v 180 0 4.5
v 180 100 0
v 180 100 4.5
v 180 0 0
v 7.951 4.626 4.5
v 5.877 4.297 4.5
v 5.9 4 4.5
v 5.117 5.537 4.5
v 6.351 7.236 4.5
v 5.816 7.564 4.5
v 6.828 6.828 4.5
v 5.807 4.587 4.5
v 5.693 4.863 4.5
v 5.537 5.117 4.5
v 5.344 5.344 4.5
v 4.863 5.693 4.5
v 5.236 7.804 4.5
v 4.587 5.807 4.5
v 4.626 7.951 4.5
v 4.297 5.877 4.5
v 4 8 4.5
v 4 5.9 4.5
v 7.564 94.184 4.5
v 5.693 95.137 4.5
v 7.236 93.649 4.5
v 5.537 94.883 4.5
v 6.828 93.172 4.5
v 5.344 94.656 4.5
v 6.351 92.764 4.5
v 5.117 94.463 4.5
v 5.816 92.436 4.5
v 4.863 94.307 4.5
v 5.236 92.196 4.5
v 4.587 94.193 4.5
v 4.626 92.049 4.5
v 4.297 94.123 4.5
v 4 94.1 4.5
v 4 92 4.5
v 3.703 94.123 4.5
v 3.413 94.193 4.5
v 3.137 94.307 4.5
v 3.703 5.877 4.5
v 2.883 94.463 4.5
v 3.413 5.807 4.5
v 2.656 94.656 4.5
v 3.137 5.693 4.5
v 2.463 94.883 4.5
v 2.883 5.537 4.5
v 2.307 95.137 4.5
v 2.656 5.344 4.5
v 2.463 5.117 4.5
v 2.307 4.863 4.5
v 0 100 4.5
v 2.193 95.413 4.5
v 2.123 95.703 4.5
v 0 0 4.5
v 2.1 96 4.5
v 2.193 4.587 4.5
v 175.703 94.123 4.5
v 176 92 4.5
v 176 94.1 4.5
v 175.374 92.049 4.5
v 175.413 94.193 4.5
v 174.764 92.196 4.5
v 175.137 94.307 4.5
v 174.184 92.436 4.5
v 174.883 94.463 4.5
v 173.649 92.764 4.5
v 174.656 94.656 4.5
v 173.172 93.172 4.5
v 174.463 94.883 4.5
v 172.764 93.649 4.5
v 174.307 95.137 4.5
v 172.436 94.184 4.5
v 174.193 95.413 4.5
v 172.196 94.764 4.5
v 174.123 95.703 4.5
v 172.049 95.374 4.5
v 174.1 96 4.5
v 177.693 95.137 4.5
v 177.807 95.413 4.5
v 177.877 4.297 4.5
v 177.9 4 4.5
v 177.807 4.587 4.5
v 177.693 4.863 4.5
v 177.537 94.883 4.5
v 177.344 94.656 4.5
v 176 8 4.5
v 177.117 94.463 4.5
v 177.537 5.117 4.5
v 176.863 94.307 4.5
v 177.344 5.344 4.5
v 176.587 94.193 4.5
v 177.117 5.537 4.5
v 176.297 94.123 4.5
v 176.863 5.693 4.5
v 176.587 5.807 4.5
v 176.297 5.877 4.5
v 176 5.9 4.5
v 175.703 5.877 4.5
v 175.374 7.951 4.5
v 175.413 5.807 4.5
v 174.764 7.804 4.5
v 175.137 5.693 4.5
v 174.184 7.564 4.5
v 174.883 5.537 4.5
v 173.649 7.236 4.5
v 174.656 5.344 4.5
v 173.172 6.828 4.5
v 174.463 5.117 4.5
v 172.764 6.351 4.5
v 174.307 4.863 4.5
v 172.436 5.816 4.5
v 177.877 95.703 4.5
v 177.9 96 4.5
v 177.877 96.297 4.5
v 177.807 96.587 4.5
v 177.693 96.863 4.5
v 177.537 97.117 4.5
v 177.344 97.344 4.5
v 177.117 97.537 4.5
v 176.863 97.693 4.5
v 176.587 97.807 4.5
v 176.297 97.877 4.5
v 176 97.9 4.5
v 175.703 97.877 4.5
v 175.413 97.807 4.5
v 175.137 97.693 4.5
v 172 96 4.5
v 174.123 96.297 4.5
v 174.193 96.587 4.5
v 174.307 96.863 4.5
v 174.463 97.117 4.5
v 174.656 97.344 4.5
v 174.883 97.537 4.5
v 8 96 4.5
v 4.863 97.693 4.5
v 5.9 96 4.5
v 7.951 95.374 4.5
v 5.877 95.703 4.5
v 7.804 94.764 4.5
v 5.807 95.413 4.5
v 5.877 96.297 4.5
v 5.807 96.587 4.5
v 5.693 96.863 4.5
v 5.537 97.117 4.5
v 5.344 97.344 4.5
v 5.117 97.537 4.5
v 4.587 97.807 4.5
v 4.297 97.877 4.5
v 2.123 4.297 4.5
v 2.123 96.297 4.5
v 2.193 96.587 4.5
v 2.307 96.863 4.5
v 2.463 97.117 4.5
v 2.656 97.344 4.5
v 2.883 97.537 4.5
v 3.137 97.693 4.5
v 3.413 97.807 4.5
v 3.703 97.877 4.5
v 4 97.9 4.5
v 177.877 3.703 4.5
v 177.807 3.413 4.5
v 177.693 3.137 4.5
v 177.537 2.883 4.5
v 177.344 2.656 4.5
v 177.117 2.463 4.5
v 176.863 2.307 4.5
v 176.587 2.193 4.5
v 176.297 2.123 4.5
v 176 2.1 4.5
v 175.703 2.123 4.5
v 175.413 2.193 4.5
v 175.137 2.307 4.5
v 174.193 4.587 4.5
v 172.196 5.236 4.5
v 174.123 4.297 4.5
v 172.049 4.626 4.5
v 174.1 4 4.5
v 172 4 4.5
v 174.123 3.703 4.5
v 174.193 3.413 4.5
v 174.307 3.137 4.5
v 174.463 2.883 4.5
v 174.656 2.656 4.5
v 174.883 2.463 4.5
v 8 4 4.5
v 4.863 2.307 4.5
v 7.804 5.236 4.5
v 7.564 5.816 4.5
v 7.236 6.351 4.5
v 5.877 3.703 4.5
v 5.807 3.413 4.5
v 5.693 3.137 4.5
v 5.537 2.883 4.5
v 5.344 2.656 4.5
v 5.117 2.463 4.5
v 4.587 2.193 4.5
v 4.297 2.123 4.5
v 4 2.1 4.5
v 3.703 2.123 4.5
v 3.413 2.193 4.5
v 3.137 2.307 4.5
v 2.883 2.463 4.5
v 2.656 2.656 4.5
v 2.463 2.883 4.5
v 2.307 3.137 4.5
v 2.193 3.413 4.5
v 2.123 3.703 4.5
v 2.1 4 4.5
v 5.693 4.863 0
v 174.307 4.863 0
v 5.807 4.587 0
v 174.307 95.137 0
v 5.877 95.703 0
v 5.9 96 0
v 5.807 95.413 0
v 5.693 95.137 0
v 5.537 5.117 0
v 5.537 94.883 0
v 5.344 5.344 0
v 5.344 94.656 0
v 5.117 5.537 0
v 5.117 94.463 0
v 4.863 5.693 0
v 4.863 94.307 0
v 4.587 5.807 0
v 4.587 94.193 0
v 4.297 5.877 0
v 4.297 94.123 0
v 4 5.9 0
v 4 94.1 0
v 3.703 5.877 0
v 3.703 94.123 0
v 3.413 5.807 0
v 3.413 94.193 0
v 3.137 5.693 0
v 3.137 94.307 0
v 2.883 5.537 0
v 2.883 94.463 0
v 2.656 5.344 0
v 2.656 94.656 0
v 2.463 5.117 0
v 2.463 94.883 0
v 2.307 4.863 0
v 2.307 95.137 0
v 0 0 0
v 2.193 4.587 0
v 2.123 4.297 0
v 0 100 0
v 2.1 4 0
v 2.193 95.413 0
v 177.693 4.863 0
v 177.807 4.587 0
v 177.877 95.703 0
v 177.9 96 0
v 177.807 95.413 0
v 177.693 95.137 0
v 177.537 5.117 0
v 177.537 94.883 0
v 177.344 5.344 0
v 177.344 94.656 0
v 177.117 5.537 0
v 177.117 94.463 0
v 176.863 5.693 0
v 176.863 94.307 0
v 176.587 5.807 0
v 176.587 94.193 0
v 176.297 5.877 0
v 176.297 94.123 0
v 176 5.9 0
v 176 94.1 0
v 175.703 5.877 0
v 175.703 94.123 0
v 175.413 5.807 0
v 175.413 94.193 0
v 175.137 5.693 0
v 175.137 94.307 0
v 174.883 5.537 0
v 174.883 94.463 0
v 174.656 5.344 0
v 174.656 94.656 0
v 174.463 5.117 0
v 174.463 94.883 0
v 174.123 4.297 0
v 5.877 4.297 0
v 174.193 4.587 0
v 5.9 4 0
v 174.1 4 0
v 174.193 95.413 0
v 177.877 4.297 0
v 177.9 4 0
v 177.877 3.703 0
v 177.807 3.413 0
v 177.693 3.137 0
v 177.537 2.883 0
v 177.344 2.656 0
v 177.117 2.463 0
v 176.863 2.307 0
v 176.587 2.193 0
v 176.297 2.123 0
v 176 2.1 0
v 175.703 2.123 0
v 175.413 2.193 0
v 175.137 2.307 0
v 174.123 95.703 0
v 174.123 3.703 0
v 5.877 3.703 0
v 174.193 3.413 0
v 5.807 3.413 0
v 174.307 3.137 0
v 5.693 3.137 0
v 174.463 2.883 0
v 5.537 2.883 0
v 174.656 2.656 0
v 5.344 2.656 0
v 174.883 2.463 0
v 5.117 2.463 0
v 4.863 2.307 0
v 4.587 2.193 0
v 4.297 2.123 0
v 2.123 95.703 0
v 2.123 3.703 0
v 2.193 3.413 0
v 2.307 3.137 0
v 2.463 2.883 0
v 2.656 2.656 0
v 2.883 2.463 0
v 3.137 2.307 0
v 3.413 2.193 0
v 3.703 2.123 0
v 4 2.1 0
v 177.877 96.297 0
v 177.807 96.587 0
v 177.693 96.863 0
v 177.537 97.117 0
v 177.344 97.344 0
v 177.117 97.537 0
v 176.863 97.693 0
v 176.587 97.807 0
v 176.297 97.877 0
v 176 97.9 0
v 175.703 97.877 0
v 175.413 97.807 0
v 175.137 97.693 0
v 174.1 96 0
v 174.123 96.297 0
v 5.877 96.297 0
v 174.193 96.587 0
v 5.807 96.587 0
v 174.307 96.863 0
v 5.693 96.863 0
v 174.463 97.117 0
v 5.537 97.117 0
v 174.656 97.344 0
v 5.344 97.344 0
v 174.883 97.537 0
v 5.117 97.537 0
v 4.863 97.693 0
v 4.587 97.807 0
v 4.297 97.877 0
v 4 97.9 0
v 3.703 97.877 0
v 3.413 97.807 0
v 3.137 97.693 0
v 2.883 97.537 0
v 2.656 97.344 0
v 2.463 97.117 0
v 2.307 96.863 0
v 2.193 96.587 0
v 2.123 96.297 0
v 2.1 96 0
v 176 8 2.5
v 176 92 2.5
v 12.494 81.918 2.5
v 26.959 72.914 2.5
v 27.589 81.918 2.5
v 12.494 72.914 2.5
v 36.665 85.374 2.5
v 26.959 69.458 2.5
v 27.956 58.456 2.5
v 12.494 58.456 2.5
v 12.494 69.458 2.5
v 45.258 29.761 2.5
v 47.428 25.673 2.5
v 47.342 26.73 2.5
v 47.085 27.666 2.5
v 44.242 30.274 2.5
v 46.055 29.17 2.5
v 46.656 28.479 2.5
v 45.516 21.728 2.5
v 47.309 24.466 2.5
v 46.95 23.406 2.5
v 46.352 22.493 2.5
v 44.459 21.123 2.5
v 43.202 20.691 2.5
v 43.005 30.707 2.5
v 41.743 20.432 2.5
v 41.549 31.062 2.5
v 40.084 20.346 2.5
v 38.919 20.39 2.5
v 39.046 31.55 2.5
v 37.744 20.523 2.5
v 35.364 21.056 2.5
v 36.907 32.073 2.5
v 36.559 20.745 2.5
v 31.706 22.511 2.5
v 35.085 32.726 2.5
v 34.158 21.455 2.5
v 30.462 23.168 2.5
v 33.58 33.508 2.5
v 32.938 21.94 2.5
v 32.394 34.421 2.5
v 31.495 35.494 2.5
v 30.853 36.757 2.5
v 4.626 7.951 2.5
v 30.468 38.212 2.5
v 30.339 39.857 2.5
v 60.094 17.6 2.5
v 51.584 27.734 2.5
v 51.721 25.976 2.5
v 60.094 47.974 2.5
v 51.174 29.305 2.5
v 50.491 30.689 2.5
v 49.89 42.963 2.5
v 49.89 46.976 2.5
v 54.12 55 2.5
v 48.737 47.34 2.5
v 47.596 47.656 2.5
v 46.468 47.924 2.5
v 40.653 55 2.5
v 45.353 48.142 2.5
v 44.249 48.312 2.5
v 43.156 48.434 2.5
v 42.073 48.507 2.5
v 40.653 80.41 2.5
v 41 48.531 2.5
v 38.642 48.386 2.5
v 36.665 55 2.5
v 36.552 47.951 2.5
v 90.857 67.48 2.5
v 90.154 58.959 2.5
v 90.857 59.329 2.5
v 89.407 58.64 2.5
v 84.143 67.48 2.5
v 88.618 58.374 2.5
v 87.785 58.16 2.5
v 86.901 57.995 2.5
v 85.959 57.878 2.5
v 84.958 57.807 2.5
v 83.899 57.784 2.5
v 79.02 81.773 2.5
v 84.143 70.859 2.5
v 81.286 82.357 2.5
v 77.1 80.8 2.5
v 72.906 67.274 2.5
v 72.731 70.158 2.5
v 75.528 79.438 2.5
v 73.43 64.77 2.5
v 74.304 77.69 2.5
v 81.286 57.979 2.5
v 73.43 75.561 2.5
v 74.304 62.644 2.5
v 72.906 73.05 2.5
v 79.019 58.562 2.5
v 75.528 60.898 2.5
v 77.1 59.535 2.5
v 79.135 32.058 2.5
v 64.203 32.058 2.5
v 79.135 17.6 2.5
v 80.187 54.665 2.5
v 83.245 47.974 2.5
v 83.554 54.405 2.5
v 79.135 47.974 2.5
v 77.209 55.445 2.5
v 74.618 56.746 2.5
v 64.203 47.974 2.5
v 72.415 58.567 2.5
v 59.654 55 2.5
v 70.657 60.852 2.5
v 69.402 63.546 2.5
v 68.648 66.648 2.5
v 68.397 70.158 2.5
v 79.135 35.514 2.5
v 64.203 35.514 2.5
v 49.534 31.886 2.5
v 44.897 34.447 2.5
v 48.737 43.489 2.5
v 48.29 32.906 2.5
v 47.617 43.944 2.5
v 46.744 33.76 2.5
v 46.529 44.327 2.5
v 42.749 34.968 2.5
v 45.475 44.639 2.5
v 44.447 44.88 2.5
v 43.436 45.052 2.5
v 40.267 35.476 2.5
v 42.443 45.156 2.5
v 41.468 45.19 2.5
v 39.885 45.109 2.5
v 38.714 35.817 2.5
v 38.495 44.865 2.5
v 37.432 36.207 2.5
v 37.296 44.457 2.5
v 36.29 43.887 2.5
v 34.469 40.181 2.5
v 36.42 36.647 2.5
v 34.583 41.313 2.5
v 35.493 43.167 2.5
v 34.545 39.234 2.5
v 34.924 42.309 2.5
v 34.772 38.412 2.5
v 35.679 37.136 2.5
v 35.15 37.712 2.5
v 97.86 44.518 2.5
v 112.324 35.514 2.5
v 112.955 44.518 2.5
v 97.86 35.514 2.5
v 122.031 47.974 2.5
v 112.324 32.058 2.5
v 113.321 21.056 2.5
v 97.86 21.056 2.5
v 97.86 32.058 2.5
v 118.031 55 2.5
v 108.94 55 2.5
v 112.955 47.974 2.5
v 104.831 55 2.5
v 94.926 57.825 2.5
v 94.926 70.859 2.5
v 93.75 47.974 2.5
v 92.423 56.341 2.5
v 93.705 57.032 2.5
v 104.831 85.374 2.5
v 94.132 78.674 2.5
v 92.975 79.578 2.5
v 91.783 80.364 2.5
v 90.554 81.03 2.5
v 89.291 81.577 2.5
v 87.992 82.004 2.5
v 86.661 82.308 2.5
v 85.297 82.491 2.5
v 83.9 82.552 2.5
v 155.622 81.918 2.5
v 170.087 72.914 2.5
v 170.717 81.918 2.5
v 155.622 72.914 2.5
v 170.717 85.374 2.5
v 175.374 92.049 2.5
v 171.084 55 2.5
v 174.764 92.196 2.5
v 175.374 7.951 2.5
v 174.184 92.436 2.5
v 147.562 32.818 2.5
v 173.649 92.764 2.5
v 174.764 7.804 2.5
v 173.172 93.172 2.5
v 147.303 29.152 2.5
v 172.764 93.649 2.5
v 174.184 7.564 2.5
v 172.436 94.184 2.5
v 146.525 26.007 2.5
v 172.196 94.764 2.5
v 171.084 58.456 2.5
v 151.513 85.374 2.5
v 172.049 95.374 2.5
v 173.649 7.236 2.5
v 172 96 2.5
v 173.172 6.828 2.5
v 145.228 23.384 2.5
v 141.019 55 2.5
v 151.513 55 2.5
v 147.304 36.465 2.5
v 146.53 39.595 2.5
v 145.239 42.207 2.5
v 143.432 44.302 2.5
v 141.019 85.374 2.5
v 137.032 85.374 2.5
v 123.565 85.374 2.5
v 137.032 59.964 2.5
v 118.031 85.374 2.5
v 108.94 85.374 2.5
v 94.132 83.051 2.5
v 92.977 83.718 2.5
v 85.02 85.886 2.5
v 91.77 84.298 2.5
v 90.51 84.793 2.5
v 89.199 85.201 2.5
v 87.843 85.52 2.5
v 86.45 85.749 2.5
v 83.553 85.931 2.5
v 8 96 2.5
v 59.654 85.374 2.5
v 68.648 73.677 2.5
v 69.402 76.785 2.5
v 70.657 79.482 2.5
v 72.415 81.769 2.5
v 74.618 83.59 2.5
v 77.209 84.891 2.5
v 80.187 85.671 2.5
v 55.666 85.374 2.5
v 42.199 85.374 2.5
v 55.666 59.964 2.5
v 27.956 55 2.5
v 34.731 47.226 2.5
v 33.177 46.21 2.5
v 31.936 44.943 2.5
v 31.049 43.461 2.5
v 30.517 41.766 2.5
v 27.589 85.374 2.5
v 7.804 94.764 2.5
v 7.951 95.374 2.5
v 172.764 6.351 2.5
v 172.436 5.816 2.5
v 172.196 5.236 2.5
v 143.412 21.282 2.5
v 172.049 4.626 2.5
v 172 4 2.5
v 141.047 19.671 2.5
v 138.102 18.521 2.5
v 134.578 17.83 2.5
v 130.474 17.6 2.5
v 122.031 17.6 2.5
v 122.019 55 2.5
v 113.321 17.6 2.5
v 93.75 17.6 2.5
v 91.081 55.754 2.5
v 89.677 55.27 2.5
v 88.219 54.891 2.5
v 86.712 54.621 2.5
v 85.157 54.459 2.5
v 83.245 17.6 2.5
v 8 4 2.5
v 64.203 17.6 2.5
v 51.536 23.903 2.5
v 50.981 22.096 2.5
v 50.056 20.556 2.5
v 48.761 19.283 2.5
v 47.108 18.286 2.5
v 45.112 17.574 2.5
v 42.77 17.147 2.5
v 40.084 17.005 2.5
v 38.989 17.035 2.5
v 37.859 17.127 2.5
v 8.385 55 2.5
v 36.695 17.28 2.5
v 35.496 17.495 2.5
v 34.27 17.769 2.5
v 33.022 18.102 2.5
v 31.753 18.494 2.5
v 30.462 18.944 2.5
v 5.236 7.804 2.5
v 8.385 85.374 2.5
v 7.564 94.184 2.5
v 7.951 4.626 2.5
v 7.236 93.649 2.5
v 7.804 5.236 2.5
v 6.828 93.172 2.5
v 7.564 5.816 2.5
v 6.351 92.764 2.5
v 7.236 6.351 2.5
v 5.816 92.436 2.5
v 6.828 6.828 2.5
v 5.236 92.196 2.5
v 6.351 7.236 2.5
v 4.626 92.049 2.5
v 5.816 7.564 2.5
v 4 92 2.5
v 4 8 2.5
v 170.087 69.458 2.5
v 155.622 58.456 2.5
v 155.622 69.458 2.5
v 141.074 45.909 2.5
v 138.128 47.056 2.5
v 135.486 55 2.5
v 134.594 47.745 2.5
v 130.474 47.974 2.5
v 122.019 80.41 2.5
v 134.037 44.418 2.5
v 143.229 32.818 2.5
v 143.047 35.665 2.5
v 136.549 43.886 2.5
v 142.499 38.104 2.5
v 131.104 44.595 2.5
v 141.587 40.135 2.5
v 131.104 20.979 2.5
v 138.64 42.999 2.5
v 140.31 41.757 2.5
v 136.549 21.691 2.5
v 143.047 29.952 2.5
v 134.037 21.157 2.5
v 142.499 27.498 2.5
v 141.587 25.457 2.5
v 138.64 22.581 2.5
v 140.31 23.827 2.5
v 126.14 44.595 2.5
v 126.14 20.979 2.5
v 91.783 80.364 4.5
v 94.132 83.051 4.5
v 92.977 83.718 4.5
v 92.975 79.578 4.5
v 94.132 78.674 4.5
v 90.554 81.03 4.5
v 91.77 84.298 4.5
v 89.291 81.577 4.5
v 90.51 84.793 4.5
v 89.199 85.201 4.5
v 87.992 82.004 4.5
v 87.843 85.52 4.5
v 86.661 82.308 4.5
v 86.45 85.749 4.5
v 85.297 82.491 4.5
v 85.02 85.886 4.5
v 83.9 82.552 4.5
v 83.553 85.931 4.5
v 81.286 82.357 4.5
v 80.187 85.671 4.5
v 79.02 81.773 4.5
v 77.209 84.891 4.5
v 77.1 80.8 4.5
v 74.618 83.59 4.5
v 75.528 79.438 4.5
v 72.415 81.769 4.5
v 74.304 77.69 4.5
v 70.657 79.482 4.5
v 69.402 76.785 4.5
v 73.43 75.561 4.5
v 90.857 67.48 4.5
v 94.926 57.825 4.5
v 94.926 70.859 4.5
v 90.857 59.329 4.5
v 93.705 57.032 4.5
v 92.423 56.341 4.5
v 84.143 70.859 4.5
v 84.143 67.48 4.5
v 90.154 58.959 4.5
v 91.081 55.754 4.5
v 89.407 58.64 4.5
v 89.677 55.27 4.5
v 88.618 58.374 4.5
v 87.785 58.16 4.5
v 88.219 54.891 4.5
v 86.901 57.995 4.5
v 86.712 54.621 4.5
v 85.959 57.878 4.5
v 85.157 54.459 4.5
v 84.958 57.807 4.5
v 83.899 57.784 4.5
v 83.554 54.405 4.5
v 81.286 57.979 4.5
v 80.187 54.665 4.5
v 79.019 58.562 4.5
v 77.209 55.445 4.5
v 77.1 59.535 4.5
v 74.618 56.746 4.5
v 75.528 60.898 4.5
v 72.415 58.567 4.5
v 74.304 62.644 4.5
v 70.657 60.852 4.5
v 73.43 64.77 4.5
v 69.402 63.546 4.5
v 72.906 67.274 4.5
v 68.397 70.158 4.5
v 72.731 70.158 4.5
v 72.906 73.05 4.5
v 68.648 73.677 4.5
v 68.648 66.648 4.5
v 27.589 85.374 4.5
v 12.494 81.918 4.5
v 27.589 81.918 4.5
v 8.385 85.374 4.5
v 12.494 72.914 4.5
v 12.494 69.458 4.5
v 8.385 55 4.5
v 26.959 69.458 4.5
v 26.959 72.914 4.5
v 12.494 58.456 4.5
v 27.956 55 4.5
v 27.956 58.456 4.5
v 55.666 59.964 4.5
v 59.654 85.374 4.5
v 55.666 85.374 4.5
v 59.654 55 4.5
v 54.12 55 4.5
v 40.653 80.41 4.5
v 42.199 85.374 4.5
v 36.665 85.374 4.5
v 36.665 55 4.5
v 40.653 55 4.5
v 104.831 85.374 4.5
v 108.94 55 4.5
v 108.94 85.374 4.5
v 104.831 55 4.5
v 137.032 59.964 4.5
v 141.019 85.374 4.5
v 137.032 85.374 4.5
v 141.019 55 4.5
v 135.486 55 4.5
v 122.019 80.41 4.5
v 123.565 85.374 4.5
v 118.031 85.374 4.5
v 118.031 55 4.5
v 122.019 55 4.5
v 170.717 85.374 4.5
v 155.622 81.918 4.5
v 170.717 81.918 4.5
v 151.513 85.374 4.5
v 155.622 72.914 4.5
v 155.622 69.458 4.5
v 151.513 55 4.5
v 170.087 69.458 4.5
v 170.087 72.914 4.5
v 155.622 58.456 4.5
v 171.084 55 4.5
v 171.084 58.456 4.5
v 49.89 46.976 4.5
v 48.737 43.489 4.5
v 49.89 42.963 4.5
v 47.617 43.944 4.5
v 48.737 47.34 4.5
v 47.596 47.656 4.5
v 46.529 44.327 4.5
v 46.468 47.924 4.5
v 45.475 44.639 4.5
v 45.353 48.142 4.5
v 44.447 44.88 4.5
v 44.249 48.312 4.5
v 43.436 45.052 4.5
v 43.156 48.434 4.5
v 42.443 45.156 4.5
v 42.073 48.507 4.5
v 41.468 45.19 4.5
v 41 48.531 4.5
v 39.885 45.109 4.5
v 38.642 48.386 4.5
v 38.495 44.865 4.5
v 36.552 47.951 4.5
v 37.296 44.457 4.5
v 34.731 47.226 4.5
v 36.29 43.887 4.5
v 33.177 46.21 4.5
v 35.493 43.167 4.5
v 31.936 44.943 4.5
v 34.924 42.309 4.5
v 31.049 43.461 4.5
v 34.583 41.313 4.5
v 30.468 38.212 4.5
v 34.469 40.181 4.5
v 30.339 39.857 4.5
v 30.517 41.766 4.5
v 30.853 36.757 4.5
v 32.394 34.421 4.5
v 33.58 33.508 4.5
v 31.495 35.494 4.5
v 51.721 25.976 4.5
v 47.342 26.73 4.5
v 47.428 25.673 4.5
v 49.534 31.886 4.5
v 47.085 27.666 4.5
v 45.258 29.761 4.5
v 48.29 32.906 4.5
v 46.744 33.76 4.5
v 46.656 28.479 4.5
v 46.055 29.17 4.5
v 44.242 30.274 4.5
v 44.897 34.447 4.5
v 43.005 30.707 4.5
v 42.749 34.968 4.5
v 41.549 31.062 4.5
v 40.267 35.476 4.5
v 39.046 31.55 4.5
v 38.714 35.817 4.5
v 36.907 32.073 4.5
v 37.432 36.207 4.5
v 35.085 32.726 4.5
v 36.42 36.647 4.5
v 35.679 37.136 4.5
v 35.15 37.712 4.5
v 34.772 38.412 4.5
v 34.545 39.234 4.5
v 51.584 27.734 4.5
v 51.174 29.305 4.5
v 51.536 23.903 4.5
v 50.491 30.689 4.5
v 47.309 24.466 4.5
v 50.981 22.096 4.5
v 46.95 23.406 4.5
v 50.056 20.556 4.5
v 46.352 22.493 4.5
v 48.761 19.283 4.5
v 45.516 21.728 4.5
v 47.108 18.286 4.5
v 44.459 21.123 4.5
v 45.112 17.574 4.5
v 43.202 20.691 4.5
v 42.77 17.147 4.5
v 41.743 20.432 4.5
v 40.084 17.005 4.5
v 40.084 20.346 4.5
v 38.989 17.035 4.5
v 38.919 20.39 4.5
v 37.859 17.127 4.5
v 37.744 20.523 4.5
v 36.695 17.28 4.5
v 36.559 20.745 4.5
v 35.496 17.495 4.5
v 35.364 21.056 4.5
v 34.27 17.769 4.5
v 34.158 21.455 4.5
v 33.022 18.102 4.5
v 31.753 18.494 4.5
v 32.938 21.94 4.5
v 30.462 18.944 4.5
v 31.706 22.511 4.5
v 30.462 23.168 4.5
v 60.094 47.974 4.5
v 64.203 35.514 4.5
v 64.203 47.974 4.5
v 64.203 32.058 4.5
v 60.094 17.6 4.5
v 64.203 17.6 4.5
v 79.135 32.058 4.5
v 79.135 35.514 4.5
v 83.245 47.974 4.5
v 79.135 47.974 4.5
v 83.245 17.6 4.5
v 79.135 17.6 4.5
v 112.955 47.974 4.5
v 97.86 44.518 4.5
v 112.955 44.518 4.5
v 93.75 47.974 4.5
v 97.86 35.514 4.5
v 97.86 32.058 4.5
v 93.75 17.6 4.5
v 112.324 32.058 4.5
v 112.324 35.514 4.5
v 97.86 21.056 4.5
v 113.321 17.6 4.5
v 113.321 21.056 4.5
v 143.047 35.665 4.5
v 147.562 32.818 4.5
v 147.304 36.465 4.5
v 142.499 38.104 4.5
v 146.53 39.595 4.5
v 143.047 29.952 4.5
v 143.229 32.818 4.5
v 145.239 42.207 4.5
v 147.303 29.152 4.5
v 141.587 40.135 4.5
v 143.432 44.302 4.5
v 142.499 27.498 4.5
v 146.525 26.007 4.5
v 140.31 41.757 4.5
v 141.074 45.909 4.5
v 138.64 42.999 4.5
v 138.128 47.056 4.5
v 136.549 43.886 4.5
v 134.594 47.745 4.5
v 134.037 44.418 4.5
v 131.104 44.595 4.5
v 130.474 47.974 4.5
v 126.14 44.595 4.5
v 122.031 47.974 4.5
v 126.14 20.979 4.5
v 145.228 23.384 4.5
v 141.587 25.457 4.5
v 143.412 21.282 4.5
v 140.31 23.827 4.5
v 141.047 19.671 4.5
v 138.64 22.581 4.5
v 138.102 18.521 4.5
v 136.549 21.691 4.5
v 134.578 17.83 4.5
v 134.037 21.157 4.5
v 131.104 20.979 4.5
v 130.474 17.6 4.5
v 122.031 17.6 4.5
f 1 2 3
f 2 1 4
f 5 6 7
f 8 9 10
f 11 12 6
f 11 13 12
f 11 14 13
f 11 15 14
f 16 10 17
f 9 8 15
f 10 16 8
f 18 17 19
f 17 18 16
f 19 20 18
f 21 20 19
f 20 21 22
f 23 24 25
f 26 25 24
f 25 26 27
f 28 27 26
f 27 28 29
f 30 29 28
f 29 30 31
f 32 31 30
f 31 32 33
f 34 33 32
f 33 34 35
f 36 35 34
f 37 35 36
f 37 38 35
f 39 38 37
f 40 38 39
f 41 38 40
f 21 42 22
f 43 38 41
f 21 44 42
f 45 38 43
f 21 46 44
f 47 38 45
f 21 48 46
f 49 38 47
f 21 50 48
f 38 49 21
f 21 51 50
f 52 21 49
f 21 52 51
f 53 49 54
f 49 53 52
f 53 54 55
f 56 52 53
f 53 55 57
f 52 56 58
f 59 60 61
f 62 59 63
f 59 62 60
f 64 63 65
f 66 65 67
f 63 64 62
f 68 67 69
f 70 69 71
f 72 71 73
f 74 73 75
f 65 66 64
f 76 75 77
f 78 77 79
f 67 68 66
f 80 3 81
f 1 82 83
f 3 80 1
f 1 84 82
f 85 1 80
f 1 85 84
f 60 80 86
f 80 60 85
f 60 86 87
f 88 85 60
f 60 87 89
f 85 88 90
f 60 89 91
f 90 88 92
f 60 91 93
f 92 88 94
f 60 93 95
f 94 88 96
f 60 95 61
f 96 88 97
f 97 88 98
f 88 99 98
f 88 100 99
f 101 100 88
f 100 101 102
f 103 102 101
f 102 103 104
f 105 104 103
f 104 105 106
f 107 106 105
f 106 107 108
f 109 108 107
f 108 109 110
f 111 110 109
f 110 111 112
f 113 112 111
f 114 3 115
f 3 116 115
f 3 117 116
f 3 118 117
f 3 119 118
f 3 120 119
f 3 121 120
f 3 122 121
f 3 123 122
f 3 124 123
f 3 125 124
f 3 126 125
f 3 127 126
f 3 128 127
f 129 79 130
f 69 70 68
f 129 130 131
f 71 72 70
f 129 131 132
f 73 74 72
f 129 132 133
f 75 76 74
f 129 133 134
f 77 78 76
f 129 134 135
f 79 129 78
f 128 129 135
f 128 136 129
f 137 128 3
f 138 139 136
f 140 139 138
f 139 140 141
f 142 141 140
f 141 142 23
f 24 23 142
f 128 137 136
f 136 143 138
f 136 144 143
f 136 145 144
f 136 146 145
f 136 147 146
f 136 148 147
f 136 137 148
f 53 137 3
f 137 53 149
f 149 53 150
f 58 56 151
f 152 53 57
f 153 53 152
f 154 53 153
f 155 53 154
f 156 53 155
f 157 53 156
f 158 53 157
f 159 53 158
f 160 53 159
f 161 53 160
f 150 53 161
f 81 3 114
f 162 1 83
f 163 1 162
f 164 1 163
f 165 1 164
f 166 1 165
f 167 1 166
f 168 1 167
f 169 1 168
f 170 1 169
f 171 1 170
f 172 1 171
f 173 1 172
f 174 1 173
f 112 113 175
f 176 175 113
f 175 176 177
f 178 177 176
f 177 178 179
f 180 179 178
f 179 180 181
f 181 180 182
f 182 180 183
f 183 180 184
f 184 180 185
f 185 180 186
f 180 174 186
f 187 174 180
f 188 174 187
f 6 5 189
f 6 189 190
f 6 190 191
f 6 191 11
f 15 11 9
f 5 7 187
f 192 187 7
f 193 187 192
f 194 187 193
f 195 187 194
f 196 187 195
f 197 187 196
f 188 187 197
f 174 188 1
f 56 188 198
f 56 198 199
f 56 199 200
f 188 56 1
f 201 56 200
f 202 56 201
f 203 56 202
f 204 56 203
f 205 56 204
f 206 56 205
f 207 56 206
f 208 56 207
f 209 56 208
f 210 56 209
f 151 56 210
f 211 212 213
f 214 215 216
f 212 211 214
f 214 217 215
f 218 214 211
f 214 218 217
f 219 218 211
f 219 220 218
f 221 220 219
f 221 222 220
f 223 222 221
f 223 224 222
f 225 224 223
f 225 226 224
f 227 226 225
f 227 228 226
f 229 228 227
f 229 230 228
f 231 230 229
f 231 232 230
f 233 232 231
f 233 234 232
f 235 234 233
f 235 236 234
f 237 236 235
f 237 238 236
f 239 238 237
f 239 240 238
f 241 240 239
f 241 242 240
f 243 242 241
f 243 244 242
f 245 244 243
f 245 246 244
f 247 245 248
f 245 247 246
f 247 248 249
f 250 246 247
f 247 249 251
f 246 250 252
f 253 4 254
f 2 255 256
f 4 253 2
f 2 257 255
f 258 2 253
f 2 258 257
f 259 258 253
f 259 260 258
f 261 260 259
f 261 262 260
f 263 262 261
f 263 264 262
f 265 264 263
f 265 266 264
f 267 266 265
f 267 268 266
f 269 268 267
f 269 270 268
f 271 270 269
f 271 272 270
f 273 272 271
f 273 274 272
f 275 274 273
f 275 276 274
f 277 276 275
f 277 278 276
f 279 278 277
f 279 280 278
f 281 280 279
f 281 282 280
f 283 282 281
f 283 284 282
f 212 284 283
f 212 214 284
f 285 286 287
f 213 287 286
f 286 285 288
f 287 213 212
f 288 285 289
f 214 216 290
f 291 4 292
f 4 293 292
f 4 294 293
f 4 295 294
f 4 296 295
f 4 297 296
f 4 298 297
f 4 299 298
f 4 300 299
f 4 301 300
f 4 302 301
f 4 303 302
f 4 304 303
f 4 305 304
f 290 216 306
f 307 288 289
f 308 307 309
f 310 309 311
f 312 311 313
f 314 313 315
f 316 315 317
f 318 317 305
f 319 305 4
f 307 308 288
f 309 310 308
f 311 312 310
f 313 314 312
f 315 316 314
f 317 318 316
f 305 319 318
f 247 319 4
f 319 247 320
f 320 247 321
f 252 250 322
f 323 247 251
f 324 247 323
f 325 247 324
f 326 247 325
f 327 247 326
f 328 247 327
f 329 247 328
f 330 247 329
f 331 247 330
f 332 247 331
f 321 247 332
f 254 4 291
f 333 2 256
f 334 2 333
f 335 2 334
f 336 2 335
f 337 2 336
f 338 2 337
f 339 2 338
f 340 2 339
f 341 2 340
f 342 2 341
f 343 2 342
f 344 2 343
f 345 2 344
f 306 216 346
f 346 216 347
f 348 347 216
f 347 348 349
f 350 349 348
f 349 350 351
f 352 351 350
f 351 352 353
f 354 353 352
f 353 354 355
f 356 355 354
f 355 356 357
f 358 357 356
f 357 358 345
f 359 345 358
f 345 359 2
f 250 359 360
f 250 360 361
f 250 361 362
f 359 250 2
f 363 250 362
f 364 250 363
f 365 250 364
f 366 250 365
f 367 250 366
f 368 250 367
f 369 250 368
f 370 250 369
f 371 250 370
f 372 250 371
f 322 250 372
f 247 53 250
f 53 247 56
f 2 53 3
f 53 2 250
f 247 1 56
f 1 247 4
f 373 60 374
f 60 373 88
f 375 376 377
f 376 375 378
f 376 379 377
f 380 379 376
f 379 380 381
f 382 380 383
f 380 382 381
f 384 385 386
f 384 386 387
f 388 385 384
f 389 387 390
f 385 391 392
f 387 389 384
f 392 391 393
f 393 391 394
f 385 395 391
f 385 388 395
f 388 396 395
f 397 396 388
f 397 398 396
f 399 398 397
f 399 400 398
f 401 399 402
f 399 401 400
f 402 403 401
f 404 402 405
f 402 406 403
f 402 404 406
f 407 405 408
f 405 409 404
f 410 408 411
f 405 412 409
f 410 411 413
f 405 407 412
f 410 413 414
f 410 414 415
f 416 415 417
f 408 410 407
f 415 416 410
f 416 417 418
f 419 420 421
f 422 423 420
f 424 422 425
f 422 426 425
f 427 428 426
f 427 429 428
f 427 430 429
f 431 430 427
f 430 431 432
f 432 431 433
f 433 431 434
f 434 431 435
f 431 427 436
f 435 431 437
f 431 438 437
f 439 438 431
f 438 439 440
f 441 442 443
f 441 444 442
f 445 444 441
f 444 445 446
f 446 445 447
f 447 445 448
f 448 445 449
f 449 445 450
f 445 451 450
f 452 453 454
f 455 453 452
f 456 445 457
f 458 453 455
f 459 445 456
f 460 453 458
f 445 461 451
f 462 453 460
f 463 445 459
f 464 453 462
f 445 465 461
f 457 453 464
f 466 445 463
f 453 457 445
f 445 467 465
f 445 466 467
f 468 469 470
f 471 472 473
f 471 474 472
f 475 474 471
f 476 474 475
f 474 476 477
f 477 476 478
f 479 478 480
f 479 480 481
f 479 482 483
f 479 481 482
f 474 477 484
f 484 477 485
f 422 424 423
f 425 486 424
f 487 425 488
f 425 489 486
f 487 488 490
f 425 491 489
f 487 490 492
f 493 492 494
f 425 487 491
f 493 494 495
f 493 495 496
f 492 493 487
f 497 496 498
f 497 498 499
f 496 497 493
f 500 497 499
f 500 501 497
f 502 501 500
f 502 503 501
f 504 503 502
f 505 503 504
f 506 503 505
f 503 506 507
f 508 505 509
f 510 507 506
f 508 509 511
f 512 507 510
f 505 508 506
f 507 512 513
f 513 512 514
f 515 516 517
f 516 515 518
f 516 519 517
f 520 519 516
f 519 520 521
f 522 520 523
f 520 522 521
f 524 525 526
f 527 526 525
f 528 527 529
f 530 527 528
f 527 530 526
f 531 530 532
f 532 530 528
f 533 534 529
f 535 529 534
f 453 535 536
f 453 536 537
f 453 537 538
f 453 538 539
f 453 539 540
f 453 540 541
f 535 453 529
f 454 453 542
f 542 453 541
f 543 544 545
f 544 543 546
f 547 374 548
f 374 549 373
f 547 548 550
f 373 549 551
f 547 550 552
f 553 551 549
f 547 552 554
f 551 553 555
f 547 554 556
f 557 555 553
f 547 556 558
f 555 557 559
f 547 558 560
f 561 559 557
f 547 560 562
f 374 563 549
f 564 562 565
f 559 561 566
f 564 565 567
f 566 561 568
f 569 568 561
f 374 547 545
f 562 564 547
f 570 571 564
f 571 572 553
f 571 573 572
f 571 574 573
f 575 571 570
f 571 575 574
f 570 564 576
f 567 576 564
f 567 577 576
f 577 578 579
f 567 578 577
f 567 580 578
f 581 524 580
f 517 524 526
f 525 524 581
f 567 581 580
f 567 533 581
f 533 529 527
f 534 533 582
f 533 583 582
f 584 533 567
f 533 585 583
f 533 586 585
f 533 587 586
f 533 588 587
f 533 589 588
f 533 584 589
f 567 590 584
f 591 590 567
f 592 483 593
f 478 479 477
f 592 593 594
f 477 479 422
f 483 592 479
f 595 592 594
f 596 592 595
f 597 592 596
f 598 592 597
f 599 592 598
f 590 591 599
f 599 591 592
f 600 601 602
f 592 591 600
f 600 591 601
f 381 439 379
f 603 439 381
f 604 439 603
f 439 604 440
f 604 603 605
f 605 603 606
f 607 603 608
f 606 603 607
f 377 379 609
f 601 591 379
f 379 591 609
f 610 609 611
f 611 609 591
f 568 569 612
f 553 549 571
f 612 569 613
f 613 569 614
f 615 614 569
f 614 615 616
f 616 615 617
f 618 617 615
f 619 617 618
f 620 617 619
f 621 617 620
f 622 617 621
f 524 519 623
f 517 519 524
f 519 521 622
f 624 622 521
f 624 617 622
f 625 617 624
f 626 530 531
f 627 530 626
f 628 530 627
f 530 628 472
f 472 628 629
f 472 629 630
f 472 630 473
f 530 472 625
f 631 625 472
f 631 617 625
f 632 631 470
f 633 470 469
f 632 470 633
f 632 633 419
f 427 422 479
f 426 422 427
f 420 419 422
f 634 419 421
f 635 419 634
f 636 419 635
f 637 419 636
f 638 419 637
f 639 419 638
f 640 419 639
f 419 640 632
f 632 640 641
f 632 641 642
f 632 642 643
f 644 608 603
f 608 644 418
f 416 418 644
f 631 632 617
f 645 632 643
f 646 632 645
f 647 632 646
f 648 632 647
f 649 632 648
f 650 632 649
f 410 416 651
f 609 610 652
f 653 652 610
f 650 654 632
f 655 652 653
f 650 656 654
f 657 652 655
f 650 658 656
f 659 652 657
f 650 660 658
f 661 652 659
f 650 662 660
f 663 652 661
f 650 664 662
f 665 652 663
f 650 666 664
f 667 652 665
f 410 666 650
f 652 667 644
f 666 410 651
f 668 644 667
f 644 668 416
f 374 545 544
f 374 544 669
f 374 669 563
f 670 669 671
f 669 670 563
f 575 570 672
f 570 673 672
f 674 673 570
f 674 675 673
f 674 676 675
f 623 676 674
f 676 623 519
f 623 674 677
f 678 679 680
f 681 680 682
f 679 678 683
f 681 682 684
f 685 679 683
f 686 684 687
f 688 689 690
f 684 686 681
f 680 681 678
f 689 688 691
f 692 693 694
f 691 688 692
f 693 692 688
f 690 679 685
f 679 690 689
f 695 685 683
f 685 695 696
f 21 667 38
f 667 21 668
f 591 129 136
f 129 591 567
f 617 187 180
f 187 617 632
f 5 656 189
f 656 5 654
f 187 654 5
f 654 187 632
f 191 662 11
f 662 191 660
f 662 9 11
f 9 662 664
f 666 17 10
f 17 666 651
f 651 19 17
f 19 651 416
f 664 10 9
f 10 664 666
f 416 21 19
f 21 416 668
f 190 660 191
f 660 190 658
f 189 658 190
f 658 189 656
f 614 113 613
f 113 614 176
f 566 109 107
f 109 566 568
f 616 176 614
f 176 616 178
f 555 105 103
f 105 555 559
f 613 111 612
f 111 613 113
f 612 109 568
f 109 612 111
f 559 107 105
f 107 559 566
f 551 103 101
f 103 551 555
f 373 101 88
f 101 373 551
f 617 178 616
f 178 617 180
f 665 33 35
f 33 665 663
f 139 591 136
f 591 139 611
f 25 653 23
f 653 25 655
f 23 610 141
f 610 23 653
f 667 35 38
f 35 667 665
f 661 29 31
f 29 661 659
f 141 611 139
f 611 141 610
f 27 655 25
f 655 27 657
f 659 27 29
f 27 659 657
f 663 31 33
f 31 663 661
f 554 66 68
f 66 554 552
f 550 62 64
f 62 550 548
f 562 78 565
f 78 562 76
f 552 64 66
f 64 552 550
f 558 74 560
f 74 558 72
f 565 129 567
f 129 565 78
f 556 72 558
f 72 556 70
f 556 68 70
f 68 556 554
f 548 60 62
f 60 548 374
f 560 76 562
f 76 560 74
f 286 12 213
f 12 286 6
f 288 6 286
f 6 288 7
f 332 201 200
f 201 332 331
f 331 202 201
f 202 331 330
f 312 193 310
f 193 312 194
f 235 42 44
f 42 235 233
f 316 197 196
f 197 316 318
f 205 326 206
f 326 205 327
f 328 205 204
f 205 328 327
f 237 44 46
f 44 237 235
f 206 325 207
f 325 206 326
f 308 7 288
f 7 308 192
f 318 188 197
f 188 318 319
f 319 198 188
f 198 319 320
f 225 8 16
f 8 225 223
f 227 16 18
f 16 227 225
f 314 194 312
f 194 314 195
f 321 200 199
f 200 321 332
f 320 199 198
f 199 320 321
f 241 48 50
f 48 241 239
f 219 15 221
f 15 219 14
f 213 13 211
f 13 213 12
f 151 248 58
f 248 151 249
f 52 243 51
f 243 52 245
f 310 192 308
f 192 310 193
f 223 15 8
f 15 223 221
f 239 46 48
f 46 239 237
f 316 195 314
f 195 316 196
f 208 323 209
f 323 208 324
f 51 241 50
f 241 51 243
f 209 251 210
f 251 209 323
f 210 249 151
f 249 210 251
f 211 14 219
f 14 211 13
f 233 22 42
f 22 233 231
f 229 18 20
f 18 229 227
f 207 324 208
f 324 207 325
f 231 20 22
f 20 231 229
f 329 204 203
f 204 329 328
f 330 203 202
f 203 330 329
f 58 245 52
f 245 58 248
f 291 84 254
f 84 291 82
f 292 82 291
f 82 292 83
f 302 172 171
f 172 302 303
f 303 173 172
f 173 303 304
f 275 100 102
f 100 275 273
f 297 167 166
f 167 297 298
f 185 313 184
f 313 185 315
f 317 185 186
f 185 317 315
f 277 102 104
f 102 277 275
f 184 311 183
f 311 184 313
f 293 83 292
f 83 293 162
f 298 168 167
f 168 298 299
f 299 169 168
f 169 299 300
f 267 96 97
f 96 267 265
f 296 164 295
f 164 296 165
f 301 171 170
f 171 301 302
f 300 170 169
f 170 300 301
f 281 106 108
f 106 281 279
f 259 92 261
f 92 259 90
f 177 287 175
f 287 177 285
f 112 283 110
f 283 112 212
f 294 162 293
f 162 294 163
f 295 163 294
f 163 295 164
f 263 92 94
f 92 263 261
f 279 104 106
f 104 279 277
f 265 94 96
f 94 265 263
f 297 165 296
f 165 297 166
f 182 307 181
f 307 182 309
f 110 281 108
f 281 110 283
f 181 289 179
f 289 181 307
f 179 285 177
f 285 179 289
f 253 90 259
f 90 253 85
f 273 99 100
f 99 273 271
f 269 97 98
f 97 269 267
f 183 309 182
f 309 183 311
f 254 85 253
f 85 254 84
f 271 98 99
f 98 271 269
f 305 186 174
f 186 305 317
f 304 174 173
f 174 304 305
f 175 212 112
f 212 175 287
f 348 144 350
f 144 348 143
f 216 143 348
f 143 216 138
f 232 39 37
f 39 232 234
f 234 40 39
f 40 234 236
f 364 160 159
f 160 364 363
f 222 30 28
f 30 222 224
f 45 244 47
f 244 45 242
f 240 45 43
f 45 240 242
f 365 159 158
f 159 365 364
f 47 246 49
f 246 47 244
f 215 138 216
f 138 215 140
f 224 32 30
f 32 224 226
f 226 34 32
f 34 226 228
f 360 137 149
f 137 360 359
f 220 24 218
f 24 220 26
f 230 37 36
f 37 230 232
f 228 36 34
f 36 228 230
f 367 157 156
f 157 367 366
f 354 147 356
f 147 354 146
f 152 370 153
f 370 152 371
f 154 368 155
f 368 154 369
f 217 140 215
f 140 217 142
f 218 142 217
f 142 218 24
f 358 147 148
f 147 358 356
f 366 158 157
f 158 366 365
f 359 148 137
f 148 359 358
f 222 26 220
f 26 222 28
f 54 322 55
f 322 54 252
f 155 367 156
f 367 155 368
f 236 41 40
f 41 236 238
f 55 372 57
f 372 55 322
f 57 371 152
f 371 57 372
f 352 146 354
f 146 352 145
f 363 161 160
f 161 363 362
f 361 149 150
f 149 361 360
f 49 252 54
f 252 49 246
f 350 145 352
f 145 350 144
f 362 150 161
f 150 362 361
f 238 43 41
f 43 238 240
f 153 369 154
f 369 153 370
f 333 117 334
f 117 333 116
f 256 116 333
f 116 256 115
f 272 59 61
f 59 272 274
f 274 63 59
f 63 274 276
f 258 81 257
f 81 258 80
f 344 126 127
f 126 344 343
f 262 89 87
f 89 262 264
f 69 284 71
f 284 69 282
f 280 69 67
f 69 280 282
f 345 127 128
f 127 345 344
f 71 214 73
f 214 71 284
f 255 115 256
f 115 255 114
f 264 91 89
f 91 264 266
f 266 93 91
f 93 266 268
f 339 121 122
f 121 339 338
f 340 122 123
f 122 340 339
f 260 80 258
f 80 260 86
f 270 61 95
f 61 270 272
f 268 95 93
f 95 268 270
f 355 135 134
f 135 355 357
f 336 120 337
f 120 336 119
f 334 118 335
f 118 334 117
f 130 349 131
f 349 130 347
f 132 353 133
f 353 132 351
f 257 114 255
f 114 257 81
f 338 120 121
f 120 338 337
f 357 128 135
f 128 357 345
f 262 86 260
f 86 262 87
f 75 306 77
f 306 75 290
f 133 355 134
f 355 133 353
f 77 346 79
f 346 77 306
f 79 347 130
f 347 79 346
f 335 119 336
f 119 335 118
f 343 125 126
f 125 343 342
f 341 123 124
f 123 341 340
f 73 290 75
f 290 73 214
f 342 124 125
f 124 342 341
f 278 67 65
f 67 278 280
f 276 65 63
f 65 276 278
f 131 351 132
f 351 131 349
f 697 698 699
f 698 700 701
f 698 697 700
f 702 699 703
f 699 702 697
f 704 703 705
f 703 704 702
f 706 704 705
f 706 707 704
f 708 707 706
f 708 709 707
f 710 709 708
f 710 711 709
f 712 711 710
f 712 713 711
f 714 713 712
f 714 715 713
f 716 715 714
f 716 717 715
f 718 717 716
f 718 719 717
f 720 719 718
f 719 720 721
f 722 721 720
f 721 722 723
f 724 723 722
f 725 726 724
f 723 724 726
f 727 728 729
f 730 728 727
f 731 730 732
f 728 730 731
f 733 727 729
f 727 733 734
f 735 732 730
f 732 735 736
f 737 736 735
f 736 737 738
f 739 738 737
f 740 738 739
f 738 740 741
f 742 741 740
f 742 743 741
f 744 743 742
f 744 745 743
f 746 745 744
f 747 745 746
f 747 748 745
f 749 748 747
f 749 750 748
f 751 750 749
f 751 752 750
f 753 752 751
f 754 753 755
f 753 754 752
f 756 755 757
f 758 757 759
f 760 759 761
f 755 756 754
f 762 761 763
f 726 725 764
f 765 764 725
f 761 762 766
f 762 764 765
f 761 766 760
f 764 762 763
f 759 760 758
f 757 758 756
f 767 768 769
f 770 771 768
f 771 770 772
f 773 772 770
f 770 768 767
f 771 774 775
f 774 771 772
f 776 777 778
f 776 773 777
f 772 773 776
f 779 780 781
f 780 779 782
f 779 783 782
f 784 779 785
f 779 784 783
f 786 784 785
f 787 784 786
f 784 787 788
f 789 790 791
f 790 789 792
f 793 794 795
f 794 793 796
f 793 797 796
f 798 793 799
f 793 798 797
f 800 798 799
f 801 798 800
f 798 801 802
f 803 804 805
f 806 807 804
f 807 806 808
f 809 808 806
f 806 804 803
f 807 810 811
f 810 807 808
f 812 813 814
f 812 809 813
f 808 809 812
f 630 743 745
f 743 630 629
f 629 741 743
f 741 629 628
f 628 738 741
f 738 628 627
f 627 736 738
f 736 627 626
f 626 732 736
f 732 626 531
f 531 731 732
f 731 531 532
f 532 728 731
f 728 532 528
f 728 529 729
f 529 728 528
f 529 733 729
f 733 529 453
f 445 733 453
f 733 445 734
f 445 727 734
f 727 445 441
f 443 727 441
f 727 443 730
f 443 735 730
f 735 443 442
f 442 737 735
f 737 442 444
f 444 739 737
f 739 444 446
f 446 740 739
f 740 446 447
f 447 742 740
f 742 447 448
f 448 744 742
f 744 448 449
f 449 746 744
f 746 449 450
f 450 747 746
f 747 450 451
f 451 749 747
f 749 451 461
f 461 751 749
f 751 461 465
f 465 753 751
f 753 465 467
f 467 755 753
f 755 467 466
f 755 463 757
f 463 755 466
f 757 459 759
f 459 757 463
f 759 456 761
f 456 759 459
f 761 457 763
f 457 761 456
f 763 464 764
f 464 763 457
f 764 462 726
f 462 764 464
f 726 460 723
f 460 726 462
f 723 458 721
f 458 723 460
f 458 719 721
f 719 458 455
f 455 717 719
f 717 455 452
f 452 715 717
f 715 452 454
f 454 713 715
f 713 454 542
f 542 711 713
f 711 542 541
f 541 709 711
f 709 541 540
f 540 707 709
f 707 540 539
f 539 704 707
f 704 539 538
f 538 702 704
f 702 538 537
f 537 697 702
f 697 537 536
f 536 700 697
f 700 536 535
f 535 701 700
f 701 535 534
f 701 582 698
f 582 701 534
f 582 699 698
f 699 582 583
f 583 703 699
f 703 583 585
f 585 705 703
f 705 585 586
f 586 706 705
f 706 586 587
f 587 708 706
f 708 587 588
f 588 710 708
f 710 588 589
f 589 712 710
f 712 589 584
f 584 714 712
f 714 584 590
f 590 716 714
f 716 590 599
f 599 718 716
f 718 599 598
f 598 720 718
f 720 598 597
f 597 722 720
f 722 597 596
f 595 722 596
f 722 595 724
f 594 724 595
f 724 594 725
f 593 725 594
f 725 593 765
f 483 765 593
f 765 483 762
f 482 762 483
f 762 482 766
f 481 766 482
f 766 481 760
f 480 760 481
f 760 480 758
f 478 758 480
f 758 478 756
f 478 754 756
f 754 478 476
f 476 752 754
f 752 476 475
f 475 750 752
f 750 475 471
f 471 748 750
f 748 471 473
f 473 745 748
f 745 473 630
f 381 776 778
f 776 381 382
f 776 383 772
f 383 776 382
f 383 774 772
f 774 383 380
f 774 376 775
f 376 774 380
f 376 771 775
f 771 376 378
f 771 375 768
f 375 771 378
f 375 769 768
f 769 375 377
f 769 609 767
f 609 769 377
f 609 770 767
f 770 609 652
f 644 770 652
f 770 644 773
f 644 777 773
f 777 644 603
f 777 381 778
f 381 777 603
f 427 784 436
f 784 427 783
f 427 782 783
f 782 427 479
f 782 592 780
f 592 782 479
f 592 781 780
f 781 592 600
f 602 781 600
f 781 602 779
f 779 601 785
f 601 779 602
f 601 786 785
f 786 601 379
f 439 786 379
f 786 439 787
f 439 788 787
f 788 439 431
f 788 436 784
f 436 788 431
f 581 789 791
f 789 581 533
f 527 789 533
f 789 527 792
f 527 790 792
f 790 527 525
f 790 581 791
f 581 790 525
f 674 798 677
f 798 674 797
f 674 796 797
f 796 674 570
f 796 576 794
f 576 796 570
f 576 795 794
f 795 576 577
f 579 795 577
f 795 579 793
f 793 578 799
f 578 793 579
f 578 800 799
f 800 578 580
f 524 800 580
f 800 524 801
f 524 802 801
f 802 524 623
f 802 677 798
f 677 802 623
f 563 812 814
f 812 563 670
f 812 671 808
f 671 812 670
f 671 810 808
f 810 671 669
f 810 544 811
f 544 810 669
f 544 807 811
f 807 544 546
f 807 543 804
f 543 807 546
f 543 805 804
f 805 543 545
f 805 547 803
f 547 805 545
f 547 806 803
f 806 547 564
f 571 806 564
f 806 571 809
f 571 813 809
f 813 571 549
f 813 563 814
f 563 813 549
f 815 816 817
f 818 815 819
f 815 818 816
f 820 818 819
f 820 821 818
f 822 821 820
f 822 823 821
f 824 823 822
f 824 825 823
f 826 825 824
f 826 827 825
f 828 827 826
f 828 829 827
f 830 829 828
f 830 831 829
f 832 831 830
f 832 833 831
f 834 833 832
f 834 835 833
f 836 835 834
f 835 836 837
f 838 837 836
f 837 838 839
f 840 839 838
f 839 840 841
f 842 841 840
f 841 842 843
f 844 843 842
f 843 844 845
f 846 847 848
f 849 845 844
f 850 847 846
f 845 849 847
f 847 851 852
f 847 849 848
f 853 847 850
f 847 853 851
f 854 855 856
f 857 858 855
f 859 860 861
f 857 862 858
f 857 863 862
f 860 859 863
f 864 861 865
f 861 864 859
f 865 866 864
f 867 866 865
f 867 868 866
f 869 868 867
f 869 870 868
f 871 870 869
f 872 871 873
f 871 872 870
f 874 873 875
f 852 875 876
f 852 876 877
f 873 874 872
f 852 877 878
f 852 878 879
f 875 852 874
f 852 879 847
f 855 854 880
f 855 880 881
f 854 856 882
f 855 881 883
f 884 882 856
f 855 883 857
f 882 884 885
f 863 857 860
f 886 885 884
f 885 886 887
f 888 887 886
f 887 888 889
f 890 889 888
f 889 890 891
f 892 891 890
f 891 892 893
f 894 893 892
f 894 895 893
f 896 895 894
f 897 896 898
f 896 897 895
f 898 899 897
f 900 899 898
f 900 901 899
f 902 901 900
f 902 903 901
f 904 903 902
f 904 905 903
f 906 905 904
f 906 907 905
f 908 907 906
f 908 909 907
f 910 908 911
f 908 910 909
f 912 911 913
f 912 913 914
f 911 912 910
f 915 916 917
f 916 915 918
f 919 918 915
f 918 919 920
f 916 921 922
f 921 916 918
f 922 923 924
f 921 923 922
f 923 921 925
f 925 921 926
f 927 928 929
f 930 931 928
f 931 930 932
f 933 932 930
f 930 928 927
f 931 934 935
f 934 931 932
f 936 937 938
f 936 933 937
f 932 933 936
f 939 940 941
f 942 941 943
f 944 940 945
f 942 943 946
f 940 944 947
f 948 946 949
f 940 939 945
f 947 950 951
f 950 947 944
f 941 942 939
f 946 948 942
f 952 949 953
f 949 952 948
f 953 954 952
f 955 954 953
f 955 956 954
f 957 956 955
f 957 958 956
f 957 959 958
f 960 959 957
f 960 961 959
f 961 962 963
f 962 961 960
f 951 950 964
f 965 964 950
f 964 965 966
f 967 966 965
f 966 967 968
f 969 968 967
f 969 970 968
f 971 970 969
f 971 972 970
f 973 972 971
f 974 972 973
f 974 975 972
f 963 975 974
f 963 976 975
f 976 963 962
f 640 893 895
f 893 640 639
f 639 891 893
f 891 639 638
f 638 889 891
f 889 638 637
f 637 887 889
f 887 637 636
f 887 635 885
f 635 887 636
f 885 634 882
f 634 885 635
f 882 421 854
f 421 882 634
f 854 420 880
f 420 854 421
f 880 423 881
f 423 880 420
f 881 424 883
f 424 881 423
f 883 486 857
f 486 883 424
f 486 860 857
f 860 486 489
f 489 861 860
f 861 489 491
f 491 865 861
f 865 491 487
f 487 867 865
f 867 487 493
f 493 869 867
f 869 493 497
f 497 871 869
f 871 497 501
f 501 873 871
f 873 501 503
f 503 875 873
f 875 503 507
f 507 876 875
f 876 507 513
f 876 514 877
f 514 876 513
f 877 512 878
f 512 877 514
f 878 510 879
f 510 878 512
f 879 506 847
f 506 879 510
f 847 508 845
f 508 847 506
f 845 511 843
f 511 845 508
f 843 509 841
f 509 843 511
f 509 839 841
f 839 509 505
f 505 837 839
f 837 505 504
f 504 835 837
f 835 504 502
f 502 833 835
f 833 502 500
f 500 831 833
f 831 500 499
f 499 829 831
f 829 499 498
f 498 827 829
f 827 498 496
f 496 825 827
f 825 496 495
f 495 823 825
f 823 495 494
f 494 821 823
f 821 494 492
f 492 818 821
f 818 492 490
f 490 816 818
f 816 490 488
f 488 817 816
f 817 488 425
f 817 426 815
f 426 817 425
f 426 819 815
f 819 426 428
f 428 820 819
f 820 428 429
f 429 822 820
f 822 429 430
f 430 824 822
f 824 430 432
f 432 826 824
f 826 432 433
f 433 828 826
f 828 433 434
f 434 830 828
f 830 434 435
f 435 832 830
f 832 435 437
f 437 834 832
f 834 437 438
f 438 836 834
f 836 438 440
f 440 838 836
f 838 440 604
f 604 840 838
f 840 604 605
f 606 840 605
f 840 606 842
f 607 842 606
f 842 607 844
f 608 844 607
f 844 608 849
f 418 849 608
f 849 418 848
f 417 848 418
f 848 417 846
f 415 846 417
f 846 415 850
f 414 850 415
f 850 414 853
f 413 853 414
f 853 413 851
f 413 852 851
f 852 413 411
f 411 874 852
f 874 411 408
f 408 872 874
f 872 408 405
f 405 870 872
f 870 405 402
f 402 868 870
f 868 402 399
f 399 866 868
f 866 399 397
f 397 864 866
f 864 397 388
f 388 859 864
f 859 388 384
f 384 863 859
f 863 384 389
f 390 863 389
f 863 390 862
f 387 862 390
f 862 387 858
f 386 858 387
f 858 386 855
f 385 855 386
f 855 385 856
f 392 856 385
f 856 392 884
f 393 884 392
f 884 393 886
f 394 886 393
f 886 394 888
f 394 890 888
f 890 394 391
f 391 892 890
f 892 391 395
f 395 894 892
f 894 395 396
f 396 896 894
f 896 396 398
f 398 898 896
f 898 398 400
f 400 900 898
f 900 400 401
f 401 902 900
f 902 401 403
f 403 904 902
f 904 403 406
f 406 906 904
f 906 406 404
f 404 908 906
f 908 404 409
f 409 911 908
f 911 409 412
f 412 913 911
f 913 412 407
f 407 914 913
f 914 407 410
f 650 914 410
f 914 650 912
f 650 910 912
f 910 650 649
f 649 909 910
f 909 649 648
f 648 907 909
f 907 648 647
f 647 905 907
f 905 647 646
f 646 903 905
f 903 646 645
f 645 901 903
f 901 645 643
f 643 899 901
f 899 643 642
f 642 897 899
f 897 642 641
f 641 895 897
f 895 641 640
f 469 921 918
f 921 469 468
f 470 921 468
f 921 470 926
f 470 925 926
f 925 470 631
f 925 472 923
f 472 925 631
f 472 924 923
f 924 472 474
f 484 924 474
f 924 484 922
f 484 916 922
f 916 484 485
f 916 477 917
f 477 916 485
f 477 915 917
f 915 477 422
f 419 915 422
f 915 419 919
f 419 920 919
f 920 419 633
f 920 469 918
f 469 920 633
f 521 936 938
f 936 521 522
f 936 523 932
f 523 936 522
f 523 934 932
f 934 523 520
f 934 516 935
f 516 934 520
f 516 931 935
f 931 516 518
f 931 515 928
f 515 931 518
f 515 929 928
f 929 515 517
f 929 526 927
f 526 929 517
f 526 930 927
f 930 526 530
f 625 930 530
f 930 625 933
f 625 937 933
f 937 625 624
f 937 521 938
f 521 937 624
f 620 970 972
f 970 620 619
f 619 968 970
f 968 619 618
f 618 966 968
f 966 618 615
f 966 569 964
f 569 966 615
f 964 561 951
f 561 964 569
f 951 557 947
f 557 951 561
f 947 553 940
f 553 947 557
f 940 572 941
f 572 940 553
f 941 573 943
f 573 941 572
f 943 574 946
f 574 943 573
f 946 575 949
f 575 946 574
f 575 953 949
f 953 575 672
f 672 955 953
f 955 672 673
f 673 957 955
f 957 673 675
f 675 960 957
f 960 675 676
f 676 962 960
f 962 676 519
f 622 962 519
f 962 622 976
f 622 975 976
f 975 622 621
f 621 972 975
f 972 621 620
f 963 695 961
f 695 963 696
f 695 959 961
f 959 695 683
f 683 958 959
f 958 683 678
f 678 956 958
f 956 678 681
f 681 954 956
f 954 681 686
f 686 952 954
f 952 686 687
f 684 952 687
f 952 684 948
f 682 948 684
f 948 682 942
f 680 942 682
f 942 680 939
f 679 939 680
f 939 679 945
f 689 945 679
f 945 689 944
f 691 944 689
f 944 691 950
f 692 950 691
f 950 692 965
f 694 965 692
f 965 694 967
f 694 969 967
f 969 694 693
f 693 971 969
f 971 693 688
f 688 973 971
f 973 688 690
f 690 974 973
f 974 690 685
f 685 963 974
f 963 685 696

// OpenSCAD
//  Oblong Nameplate
//  Peter Griffiths

plate_length = 180;
plate_width = 100;
plate_thickness = 4.5;
letter_depth = 2;
surround_width = 4; // Border Thickness
hole_diameter = 3.8; // zero removes holes
counter_sink = 0; // zero removes countersink
f_ont = "roboto";
f_size = 30; // Letter Size
f_space = 1.1; // Letter spacing
text1 = "ENGINE";
text2 = "SHED";

module plate()
    difference(){
        cube([plate_length,plate_width,plate_thickness]);
        translate([surround_width,surround_width,plate_thickness - letter_depth])
            cube([plate_length - surround_width*2, plate_width - surround_width*2,letter_depth+1]);
    }

module plate_main(){
 plate();
 translate([surround_width,surround_width,0])
        cylinder(r=surround_width,h=plate_thickness);
 translate([plate_length - surround_width,surround_width,0])
        cylinder(r=surround_width,h=plate_thickness);
 translate([surround_width,plate_width - surround_width,0])
        cylinder(r=surround_width,h=plate_thickness);
 translate([plate_length - surround_width,plate_width - surround_width,0])
        cylinder(r=surround_width,h=plate_thickness);
}        
 if (hole_diameter >0){
     difference(){
         plate_main();
         $fn=40;
         translate([surround_width,surround_width,-0.5])
            cylinder(d=hole_diameter , h= plate_thickness+1);
         translate([plate_length - surround_width,surround_width,-0.5])
            cylinder(d=hole_diameter, h=plate_thickness+1);
         translate([surround_width,plate_width - surround_width,-0.5])
            cylinder(d=hole_diameter, h=plate_thickness+1);
         translate([plate_length - surround_width,plate_width - surround_width,-0.5])
            cylinder(d=hole_diameter, h=plate_thickness+1);
         
         if (counter_sink >0){
             translate([surround_width,surround_width, plate_thickness- counter_sink])
             cylinder(h=counter_sink, d1=hole_diameter, d2=hole_diameter + counter_sink*2);
             translate([plate_length - surround_width,surround_width,plate_thickness-counter_sink])
             cylinder(h=counter_sink, d1=hole_diameter,   d2=hole_diameter + counter_sink*2);
             translate([surround_width,plate_width -surround_width, plate_thickness- counter_sink])
             cylinder(h=counter_sink, d1=hole_diameter, d2=hole_diameter + counter_sink*2);
             translate([plate_length - surround_width,plate_width - surround_width, plate_thickness- counter_sink])
             cylinder(h=counter_sink, d1=hole_diameter, d2=hole_diameter + counter_sink*2);
         }
     }   
 }
// Text line 1
 translate([plate_length/2,plate_width/2+f_size/6, plate_thickness - letter_depth]) {
     linear_extrude(height = letter_depth){
        text(text1, font = f_ont, size = f_size, halign = "center", spacing= f_space);
     }
 }
 // Text line 2
  translate([ plate_length/2,plate_width/2-f_size*1.08, plate_thickness - letter_depth]) {
     linear_extrude(height = letter_depth){
        text(text2, font = f_ont, size = f_size, halign = "center",spacing= f_space);
     }
 }
